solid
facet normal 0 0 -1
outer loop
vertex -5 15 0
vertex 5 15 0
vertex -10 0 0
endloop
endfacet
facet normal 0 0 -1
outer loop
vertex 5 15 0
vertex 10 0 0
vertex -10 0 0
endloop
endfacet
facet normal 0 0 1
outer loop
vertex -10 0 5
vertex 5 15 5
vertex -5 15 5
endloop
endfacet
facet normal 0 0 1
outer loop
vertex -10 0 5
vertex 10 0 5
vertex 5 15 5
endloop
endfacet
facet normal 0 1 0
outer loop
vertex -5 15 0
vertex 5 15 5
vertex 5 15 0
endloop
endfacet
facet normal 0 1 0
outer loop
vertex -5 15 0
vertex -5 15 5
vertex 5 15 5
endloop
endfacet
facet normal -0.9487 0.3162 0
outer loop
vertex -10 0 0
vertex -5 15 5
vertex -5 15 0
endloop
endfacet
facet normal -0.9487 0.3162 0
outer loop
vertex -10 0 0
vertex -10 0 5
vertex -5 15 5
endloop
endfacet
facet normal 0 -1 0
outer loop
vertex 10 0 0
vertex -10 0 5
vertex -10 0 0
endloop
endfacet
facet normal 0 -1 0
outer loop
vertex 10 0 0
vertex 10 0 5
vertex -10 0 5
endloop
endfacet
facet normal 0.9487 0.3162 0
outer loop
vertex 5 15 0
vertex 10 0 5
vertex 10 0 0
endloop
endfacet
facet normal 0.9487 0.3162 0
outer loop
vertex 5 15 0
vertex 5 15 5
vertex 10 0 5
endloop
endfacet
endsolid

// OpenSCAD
use <../nscad-lib.scad>

color("orange") trapez(x1 = 20, x2 = 10, y = 15, z = 5);
